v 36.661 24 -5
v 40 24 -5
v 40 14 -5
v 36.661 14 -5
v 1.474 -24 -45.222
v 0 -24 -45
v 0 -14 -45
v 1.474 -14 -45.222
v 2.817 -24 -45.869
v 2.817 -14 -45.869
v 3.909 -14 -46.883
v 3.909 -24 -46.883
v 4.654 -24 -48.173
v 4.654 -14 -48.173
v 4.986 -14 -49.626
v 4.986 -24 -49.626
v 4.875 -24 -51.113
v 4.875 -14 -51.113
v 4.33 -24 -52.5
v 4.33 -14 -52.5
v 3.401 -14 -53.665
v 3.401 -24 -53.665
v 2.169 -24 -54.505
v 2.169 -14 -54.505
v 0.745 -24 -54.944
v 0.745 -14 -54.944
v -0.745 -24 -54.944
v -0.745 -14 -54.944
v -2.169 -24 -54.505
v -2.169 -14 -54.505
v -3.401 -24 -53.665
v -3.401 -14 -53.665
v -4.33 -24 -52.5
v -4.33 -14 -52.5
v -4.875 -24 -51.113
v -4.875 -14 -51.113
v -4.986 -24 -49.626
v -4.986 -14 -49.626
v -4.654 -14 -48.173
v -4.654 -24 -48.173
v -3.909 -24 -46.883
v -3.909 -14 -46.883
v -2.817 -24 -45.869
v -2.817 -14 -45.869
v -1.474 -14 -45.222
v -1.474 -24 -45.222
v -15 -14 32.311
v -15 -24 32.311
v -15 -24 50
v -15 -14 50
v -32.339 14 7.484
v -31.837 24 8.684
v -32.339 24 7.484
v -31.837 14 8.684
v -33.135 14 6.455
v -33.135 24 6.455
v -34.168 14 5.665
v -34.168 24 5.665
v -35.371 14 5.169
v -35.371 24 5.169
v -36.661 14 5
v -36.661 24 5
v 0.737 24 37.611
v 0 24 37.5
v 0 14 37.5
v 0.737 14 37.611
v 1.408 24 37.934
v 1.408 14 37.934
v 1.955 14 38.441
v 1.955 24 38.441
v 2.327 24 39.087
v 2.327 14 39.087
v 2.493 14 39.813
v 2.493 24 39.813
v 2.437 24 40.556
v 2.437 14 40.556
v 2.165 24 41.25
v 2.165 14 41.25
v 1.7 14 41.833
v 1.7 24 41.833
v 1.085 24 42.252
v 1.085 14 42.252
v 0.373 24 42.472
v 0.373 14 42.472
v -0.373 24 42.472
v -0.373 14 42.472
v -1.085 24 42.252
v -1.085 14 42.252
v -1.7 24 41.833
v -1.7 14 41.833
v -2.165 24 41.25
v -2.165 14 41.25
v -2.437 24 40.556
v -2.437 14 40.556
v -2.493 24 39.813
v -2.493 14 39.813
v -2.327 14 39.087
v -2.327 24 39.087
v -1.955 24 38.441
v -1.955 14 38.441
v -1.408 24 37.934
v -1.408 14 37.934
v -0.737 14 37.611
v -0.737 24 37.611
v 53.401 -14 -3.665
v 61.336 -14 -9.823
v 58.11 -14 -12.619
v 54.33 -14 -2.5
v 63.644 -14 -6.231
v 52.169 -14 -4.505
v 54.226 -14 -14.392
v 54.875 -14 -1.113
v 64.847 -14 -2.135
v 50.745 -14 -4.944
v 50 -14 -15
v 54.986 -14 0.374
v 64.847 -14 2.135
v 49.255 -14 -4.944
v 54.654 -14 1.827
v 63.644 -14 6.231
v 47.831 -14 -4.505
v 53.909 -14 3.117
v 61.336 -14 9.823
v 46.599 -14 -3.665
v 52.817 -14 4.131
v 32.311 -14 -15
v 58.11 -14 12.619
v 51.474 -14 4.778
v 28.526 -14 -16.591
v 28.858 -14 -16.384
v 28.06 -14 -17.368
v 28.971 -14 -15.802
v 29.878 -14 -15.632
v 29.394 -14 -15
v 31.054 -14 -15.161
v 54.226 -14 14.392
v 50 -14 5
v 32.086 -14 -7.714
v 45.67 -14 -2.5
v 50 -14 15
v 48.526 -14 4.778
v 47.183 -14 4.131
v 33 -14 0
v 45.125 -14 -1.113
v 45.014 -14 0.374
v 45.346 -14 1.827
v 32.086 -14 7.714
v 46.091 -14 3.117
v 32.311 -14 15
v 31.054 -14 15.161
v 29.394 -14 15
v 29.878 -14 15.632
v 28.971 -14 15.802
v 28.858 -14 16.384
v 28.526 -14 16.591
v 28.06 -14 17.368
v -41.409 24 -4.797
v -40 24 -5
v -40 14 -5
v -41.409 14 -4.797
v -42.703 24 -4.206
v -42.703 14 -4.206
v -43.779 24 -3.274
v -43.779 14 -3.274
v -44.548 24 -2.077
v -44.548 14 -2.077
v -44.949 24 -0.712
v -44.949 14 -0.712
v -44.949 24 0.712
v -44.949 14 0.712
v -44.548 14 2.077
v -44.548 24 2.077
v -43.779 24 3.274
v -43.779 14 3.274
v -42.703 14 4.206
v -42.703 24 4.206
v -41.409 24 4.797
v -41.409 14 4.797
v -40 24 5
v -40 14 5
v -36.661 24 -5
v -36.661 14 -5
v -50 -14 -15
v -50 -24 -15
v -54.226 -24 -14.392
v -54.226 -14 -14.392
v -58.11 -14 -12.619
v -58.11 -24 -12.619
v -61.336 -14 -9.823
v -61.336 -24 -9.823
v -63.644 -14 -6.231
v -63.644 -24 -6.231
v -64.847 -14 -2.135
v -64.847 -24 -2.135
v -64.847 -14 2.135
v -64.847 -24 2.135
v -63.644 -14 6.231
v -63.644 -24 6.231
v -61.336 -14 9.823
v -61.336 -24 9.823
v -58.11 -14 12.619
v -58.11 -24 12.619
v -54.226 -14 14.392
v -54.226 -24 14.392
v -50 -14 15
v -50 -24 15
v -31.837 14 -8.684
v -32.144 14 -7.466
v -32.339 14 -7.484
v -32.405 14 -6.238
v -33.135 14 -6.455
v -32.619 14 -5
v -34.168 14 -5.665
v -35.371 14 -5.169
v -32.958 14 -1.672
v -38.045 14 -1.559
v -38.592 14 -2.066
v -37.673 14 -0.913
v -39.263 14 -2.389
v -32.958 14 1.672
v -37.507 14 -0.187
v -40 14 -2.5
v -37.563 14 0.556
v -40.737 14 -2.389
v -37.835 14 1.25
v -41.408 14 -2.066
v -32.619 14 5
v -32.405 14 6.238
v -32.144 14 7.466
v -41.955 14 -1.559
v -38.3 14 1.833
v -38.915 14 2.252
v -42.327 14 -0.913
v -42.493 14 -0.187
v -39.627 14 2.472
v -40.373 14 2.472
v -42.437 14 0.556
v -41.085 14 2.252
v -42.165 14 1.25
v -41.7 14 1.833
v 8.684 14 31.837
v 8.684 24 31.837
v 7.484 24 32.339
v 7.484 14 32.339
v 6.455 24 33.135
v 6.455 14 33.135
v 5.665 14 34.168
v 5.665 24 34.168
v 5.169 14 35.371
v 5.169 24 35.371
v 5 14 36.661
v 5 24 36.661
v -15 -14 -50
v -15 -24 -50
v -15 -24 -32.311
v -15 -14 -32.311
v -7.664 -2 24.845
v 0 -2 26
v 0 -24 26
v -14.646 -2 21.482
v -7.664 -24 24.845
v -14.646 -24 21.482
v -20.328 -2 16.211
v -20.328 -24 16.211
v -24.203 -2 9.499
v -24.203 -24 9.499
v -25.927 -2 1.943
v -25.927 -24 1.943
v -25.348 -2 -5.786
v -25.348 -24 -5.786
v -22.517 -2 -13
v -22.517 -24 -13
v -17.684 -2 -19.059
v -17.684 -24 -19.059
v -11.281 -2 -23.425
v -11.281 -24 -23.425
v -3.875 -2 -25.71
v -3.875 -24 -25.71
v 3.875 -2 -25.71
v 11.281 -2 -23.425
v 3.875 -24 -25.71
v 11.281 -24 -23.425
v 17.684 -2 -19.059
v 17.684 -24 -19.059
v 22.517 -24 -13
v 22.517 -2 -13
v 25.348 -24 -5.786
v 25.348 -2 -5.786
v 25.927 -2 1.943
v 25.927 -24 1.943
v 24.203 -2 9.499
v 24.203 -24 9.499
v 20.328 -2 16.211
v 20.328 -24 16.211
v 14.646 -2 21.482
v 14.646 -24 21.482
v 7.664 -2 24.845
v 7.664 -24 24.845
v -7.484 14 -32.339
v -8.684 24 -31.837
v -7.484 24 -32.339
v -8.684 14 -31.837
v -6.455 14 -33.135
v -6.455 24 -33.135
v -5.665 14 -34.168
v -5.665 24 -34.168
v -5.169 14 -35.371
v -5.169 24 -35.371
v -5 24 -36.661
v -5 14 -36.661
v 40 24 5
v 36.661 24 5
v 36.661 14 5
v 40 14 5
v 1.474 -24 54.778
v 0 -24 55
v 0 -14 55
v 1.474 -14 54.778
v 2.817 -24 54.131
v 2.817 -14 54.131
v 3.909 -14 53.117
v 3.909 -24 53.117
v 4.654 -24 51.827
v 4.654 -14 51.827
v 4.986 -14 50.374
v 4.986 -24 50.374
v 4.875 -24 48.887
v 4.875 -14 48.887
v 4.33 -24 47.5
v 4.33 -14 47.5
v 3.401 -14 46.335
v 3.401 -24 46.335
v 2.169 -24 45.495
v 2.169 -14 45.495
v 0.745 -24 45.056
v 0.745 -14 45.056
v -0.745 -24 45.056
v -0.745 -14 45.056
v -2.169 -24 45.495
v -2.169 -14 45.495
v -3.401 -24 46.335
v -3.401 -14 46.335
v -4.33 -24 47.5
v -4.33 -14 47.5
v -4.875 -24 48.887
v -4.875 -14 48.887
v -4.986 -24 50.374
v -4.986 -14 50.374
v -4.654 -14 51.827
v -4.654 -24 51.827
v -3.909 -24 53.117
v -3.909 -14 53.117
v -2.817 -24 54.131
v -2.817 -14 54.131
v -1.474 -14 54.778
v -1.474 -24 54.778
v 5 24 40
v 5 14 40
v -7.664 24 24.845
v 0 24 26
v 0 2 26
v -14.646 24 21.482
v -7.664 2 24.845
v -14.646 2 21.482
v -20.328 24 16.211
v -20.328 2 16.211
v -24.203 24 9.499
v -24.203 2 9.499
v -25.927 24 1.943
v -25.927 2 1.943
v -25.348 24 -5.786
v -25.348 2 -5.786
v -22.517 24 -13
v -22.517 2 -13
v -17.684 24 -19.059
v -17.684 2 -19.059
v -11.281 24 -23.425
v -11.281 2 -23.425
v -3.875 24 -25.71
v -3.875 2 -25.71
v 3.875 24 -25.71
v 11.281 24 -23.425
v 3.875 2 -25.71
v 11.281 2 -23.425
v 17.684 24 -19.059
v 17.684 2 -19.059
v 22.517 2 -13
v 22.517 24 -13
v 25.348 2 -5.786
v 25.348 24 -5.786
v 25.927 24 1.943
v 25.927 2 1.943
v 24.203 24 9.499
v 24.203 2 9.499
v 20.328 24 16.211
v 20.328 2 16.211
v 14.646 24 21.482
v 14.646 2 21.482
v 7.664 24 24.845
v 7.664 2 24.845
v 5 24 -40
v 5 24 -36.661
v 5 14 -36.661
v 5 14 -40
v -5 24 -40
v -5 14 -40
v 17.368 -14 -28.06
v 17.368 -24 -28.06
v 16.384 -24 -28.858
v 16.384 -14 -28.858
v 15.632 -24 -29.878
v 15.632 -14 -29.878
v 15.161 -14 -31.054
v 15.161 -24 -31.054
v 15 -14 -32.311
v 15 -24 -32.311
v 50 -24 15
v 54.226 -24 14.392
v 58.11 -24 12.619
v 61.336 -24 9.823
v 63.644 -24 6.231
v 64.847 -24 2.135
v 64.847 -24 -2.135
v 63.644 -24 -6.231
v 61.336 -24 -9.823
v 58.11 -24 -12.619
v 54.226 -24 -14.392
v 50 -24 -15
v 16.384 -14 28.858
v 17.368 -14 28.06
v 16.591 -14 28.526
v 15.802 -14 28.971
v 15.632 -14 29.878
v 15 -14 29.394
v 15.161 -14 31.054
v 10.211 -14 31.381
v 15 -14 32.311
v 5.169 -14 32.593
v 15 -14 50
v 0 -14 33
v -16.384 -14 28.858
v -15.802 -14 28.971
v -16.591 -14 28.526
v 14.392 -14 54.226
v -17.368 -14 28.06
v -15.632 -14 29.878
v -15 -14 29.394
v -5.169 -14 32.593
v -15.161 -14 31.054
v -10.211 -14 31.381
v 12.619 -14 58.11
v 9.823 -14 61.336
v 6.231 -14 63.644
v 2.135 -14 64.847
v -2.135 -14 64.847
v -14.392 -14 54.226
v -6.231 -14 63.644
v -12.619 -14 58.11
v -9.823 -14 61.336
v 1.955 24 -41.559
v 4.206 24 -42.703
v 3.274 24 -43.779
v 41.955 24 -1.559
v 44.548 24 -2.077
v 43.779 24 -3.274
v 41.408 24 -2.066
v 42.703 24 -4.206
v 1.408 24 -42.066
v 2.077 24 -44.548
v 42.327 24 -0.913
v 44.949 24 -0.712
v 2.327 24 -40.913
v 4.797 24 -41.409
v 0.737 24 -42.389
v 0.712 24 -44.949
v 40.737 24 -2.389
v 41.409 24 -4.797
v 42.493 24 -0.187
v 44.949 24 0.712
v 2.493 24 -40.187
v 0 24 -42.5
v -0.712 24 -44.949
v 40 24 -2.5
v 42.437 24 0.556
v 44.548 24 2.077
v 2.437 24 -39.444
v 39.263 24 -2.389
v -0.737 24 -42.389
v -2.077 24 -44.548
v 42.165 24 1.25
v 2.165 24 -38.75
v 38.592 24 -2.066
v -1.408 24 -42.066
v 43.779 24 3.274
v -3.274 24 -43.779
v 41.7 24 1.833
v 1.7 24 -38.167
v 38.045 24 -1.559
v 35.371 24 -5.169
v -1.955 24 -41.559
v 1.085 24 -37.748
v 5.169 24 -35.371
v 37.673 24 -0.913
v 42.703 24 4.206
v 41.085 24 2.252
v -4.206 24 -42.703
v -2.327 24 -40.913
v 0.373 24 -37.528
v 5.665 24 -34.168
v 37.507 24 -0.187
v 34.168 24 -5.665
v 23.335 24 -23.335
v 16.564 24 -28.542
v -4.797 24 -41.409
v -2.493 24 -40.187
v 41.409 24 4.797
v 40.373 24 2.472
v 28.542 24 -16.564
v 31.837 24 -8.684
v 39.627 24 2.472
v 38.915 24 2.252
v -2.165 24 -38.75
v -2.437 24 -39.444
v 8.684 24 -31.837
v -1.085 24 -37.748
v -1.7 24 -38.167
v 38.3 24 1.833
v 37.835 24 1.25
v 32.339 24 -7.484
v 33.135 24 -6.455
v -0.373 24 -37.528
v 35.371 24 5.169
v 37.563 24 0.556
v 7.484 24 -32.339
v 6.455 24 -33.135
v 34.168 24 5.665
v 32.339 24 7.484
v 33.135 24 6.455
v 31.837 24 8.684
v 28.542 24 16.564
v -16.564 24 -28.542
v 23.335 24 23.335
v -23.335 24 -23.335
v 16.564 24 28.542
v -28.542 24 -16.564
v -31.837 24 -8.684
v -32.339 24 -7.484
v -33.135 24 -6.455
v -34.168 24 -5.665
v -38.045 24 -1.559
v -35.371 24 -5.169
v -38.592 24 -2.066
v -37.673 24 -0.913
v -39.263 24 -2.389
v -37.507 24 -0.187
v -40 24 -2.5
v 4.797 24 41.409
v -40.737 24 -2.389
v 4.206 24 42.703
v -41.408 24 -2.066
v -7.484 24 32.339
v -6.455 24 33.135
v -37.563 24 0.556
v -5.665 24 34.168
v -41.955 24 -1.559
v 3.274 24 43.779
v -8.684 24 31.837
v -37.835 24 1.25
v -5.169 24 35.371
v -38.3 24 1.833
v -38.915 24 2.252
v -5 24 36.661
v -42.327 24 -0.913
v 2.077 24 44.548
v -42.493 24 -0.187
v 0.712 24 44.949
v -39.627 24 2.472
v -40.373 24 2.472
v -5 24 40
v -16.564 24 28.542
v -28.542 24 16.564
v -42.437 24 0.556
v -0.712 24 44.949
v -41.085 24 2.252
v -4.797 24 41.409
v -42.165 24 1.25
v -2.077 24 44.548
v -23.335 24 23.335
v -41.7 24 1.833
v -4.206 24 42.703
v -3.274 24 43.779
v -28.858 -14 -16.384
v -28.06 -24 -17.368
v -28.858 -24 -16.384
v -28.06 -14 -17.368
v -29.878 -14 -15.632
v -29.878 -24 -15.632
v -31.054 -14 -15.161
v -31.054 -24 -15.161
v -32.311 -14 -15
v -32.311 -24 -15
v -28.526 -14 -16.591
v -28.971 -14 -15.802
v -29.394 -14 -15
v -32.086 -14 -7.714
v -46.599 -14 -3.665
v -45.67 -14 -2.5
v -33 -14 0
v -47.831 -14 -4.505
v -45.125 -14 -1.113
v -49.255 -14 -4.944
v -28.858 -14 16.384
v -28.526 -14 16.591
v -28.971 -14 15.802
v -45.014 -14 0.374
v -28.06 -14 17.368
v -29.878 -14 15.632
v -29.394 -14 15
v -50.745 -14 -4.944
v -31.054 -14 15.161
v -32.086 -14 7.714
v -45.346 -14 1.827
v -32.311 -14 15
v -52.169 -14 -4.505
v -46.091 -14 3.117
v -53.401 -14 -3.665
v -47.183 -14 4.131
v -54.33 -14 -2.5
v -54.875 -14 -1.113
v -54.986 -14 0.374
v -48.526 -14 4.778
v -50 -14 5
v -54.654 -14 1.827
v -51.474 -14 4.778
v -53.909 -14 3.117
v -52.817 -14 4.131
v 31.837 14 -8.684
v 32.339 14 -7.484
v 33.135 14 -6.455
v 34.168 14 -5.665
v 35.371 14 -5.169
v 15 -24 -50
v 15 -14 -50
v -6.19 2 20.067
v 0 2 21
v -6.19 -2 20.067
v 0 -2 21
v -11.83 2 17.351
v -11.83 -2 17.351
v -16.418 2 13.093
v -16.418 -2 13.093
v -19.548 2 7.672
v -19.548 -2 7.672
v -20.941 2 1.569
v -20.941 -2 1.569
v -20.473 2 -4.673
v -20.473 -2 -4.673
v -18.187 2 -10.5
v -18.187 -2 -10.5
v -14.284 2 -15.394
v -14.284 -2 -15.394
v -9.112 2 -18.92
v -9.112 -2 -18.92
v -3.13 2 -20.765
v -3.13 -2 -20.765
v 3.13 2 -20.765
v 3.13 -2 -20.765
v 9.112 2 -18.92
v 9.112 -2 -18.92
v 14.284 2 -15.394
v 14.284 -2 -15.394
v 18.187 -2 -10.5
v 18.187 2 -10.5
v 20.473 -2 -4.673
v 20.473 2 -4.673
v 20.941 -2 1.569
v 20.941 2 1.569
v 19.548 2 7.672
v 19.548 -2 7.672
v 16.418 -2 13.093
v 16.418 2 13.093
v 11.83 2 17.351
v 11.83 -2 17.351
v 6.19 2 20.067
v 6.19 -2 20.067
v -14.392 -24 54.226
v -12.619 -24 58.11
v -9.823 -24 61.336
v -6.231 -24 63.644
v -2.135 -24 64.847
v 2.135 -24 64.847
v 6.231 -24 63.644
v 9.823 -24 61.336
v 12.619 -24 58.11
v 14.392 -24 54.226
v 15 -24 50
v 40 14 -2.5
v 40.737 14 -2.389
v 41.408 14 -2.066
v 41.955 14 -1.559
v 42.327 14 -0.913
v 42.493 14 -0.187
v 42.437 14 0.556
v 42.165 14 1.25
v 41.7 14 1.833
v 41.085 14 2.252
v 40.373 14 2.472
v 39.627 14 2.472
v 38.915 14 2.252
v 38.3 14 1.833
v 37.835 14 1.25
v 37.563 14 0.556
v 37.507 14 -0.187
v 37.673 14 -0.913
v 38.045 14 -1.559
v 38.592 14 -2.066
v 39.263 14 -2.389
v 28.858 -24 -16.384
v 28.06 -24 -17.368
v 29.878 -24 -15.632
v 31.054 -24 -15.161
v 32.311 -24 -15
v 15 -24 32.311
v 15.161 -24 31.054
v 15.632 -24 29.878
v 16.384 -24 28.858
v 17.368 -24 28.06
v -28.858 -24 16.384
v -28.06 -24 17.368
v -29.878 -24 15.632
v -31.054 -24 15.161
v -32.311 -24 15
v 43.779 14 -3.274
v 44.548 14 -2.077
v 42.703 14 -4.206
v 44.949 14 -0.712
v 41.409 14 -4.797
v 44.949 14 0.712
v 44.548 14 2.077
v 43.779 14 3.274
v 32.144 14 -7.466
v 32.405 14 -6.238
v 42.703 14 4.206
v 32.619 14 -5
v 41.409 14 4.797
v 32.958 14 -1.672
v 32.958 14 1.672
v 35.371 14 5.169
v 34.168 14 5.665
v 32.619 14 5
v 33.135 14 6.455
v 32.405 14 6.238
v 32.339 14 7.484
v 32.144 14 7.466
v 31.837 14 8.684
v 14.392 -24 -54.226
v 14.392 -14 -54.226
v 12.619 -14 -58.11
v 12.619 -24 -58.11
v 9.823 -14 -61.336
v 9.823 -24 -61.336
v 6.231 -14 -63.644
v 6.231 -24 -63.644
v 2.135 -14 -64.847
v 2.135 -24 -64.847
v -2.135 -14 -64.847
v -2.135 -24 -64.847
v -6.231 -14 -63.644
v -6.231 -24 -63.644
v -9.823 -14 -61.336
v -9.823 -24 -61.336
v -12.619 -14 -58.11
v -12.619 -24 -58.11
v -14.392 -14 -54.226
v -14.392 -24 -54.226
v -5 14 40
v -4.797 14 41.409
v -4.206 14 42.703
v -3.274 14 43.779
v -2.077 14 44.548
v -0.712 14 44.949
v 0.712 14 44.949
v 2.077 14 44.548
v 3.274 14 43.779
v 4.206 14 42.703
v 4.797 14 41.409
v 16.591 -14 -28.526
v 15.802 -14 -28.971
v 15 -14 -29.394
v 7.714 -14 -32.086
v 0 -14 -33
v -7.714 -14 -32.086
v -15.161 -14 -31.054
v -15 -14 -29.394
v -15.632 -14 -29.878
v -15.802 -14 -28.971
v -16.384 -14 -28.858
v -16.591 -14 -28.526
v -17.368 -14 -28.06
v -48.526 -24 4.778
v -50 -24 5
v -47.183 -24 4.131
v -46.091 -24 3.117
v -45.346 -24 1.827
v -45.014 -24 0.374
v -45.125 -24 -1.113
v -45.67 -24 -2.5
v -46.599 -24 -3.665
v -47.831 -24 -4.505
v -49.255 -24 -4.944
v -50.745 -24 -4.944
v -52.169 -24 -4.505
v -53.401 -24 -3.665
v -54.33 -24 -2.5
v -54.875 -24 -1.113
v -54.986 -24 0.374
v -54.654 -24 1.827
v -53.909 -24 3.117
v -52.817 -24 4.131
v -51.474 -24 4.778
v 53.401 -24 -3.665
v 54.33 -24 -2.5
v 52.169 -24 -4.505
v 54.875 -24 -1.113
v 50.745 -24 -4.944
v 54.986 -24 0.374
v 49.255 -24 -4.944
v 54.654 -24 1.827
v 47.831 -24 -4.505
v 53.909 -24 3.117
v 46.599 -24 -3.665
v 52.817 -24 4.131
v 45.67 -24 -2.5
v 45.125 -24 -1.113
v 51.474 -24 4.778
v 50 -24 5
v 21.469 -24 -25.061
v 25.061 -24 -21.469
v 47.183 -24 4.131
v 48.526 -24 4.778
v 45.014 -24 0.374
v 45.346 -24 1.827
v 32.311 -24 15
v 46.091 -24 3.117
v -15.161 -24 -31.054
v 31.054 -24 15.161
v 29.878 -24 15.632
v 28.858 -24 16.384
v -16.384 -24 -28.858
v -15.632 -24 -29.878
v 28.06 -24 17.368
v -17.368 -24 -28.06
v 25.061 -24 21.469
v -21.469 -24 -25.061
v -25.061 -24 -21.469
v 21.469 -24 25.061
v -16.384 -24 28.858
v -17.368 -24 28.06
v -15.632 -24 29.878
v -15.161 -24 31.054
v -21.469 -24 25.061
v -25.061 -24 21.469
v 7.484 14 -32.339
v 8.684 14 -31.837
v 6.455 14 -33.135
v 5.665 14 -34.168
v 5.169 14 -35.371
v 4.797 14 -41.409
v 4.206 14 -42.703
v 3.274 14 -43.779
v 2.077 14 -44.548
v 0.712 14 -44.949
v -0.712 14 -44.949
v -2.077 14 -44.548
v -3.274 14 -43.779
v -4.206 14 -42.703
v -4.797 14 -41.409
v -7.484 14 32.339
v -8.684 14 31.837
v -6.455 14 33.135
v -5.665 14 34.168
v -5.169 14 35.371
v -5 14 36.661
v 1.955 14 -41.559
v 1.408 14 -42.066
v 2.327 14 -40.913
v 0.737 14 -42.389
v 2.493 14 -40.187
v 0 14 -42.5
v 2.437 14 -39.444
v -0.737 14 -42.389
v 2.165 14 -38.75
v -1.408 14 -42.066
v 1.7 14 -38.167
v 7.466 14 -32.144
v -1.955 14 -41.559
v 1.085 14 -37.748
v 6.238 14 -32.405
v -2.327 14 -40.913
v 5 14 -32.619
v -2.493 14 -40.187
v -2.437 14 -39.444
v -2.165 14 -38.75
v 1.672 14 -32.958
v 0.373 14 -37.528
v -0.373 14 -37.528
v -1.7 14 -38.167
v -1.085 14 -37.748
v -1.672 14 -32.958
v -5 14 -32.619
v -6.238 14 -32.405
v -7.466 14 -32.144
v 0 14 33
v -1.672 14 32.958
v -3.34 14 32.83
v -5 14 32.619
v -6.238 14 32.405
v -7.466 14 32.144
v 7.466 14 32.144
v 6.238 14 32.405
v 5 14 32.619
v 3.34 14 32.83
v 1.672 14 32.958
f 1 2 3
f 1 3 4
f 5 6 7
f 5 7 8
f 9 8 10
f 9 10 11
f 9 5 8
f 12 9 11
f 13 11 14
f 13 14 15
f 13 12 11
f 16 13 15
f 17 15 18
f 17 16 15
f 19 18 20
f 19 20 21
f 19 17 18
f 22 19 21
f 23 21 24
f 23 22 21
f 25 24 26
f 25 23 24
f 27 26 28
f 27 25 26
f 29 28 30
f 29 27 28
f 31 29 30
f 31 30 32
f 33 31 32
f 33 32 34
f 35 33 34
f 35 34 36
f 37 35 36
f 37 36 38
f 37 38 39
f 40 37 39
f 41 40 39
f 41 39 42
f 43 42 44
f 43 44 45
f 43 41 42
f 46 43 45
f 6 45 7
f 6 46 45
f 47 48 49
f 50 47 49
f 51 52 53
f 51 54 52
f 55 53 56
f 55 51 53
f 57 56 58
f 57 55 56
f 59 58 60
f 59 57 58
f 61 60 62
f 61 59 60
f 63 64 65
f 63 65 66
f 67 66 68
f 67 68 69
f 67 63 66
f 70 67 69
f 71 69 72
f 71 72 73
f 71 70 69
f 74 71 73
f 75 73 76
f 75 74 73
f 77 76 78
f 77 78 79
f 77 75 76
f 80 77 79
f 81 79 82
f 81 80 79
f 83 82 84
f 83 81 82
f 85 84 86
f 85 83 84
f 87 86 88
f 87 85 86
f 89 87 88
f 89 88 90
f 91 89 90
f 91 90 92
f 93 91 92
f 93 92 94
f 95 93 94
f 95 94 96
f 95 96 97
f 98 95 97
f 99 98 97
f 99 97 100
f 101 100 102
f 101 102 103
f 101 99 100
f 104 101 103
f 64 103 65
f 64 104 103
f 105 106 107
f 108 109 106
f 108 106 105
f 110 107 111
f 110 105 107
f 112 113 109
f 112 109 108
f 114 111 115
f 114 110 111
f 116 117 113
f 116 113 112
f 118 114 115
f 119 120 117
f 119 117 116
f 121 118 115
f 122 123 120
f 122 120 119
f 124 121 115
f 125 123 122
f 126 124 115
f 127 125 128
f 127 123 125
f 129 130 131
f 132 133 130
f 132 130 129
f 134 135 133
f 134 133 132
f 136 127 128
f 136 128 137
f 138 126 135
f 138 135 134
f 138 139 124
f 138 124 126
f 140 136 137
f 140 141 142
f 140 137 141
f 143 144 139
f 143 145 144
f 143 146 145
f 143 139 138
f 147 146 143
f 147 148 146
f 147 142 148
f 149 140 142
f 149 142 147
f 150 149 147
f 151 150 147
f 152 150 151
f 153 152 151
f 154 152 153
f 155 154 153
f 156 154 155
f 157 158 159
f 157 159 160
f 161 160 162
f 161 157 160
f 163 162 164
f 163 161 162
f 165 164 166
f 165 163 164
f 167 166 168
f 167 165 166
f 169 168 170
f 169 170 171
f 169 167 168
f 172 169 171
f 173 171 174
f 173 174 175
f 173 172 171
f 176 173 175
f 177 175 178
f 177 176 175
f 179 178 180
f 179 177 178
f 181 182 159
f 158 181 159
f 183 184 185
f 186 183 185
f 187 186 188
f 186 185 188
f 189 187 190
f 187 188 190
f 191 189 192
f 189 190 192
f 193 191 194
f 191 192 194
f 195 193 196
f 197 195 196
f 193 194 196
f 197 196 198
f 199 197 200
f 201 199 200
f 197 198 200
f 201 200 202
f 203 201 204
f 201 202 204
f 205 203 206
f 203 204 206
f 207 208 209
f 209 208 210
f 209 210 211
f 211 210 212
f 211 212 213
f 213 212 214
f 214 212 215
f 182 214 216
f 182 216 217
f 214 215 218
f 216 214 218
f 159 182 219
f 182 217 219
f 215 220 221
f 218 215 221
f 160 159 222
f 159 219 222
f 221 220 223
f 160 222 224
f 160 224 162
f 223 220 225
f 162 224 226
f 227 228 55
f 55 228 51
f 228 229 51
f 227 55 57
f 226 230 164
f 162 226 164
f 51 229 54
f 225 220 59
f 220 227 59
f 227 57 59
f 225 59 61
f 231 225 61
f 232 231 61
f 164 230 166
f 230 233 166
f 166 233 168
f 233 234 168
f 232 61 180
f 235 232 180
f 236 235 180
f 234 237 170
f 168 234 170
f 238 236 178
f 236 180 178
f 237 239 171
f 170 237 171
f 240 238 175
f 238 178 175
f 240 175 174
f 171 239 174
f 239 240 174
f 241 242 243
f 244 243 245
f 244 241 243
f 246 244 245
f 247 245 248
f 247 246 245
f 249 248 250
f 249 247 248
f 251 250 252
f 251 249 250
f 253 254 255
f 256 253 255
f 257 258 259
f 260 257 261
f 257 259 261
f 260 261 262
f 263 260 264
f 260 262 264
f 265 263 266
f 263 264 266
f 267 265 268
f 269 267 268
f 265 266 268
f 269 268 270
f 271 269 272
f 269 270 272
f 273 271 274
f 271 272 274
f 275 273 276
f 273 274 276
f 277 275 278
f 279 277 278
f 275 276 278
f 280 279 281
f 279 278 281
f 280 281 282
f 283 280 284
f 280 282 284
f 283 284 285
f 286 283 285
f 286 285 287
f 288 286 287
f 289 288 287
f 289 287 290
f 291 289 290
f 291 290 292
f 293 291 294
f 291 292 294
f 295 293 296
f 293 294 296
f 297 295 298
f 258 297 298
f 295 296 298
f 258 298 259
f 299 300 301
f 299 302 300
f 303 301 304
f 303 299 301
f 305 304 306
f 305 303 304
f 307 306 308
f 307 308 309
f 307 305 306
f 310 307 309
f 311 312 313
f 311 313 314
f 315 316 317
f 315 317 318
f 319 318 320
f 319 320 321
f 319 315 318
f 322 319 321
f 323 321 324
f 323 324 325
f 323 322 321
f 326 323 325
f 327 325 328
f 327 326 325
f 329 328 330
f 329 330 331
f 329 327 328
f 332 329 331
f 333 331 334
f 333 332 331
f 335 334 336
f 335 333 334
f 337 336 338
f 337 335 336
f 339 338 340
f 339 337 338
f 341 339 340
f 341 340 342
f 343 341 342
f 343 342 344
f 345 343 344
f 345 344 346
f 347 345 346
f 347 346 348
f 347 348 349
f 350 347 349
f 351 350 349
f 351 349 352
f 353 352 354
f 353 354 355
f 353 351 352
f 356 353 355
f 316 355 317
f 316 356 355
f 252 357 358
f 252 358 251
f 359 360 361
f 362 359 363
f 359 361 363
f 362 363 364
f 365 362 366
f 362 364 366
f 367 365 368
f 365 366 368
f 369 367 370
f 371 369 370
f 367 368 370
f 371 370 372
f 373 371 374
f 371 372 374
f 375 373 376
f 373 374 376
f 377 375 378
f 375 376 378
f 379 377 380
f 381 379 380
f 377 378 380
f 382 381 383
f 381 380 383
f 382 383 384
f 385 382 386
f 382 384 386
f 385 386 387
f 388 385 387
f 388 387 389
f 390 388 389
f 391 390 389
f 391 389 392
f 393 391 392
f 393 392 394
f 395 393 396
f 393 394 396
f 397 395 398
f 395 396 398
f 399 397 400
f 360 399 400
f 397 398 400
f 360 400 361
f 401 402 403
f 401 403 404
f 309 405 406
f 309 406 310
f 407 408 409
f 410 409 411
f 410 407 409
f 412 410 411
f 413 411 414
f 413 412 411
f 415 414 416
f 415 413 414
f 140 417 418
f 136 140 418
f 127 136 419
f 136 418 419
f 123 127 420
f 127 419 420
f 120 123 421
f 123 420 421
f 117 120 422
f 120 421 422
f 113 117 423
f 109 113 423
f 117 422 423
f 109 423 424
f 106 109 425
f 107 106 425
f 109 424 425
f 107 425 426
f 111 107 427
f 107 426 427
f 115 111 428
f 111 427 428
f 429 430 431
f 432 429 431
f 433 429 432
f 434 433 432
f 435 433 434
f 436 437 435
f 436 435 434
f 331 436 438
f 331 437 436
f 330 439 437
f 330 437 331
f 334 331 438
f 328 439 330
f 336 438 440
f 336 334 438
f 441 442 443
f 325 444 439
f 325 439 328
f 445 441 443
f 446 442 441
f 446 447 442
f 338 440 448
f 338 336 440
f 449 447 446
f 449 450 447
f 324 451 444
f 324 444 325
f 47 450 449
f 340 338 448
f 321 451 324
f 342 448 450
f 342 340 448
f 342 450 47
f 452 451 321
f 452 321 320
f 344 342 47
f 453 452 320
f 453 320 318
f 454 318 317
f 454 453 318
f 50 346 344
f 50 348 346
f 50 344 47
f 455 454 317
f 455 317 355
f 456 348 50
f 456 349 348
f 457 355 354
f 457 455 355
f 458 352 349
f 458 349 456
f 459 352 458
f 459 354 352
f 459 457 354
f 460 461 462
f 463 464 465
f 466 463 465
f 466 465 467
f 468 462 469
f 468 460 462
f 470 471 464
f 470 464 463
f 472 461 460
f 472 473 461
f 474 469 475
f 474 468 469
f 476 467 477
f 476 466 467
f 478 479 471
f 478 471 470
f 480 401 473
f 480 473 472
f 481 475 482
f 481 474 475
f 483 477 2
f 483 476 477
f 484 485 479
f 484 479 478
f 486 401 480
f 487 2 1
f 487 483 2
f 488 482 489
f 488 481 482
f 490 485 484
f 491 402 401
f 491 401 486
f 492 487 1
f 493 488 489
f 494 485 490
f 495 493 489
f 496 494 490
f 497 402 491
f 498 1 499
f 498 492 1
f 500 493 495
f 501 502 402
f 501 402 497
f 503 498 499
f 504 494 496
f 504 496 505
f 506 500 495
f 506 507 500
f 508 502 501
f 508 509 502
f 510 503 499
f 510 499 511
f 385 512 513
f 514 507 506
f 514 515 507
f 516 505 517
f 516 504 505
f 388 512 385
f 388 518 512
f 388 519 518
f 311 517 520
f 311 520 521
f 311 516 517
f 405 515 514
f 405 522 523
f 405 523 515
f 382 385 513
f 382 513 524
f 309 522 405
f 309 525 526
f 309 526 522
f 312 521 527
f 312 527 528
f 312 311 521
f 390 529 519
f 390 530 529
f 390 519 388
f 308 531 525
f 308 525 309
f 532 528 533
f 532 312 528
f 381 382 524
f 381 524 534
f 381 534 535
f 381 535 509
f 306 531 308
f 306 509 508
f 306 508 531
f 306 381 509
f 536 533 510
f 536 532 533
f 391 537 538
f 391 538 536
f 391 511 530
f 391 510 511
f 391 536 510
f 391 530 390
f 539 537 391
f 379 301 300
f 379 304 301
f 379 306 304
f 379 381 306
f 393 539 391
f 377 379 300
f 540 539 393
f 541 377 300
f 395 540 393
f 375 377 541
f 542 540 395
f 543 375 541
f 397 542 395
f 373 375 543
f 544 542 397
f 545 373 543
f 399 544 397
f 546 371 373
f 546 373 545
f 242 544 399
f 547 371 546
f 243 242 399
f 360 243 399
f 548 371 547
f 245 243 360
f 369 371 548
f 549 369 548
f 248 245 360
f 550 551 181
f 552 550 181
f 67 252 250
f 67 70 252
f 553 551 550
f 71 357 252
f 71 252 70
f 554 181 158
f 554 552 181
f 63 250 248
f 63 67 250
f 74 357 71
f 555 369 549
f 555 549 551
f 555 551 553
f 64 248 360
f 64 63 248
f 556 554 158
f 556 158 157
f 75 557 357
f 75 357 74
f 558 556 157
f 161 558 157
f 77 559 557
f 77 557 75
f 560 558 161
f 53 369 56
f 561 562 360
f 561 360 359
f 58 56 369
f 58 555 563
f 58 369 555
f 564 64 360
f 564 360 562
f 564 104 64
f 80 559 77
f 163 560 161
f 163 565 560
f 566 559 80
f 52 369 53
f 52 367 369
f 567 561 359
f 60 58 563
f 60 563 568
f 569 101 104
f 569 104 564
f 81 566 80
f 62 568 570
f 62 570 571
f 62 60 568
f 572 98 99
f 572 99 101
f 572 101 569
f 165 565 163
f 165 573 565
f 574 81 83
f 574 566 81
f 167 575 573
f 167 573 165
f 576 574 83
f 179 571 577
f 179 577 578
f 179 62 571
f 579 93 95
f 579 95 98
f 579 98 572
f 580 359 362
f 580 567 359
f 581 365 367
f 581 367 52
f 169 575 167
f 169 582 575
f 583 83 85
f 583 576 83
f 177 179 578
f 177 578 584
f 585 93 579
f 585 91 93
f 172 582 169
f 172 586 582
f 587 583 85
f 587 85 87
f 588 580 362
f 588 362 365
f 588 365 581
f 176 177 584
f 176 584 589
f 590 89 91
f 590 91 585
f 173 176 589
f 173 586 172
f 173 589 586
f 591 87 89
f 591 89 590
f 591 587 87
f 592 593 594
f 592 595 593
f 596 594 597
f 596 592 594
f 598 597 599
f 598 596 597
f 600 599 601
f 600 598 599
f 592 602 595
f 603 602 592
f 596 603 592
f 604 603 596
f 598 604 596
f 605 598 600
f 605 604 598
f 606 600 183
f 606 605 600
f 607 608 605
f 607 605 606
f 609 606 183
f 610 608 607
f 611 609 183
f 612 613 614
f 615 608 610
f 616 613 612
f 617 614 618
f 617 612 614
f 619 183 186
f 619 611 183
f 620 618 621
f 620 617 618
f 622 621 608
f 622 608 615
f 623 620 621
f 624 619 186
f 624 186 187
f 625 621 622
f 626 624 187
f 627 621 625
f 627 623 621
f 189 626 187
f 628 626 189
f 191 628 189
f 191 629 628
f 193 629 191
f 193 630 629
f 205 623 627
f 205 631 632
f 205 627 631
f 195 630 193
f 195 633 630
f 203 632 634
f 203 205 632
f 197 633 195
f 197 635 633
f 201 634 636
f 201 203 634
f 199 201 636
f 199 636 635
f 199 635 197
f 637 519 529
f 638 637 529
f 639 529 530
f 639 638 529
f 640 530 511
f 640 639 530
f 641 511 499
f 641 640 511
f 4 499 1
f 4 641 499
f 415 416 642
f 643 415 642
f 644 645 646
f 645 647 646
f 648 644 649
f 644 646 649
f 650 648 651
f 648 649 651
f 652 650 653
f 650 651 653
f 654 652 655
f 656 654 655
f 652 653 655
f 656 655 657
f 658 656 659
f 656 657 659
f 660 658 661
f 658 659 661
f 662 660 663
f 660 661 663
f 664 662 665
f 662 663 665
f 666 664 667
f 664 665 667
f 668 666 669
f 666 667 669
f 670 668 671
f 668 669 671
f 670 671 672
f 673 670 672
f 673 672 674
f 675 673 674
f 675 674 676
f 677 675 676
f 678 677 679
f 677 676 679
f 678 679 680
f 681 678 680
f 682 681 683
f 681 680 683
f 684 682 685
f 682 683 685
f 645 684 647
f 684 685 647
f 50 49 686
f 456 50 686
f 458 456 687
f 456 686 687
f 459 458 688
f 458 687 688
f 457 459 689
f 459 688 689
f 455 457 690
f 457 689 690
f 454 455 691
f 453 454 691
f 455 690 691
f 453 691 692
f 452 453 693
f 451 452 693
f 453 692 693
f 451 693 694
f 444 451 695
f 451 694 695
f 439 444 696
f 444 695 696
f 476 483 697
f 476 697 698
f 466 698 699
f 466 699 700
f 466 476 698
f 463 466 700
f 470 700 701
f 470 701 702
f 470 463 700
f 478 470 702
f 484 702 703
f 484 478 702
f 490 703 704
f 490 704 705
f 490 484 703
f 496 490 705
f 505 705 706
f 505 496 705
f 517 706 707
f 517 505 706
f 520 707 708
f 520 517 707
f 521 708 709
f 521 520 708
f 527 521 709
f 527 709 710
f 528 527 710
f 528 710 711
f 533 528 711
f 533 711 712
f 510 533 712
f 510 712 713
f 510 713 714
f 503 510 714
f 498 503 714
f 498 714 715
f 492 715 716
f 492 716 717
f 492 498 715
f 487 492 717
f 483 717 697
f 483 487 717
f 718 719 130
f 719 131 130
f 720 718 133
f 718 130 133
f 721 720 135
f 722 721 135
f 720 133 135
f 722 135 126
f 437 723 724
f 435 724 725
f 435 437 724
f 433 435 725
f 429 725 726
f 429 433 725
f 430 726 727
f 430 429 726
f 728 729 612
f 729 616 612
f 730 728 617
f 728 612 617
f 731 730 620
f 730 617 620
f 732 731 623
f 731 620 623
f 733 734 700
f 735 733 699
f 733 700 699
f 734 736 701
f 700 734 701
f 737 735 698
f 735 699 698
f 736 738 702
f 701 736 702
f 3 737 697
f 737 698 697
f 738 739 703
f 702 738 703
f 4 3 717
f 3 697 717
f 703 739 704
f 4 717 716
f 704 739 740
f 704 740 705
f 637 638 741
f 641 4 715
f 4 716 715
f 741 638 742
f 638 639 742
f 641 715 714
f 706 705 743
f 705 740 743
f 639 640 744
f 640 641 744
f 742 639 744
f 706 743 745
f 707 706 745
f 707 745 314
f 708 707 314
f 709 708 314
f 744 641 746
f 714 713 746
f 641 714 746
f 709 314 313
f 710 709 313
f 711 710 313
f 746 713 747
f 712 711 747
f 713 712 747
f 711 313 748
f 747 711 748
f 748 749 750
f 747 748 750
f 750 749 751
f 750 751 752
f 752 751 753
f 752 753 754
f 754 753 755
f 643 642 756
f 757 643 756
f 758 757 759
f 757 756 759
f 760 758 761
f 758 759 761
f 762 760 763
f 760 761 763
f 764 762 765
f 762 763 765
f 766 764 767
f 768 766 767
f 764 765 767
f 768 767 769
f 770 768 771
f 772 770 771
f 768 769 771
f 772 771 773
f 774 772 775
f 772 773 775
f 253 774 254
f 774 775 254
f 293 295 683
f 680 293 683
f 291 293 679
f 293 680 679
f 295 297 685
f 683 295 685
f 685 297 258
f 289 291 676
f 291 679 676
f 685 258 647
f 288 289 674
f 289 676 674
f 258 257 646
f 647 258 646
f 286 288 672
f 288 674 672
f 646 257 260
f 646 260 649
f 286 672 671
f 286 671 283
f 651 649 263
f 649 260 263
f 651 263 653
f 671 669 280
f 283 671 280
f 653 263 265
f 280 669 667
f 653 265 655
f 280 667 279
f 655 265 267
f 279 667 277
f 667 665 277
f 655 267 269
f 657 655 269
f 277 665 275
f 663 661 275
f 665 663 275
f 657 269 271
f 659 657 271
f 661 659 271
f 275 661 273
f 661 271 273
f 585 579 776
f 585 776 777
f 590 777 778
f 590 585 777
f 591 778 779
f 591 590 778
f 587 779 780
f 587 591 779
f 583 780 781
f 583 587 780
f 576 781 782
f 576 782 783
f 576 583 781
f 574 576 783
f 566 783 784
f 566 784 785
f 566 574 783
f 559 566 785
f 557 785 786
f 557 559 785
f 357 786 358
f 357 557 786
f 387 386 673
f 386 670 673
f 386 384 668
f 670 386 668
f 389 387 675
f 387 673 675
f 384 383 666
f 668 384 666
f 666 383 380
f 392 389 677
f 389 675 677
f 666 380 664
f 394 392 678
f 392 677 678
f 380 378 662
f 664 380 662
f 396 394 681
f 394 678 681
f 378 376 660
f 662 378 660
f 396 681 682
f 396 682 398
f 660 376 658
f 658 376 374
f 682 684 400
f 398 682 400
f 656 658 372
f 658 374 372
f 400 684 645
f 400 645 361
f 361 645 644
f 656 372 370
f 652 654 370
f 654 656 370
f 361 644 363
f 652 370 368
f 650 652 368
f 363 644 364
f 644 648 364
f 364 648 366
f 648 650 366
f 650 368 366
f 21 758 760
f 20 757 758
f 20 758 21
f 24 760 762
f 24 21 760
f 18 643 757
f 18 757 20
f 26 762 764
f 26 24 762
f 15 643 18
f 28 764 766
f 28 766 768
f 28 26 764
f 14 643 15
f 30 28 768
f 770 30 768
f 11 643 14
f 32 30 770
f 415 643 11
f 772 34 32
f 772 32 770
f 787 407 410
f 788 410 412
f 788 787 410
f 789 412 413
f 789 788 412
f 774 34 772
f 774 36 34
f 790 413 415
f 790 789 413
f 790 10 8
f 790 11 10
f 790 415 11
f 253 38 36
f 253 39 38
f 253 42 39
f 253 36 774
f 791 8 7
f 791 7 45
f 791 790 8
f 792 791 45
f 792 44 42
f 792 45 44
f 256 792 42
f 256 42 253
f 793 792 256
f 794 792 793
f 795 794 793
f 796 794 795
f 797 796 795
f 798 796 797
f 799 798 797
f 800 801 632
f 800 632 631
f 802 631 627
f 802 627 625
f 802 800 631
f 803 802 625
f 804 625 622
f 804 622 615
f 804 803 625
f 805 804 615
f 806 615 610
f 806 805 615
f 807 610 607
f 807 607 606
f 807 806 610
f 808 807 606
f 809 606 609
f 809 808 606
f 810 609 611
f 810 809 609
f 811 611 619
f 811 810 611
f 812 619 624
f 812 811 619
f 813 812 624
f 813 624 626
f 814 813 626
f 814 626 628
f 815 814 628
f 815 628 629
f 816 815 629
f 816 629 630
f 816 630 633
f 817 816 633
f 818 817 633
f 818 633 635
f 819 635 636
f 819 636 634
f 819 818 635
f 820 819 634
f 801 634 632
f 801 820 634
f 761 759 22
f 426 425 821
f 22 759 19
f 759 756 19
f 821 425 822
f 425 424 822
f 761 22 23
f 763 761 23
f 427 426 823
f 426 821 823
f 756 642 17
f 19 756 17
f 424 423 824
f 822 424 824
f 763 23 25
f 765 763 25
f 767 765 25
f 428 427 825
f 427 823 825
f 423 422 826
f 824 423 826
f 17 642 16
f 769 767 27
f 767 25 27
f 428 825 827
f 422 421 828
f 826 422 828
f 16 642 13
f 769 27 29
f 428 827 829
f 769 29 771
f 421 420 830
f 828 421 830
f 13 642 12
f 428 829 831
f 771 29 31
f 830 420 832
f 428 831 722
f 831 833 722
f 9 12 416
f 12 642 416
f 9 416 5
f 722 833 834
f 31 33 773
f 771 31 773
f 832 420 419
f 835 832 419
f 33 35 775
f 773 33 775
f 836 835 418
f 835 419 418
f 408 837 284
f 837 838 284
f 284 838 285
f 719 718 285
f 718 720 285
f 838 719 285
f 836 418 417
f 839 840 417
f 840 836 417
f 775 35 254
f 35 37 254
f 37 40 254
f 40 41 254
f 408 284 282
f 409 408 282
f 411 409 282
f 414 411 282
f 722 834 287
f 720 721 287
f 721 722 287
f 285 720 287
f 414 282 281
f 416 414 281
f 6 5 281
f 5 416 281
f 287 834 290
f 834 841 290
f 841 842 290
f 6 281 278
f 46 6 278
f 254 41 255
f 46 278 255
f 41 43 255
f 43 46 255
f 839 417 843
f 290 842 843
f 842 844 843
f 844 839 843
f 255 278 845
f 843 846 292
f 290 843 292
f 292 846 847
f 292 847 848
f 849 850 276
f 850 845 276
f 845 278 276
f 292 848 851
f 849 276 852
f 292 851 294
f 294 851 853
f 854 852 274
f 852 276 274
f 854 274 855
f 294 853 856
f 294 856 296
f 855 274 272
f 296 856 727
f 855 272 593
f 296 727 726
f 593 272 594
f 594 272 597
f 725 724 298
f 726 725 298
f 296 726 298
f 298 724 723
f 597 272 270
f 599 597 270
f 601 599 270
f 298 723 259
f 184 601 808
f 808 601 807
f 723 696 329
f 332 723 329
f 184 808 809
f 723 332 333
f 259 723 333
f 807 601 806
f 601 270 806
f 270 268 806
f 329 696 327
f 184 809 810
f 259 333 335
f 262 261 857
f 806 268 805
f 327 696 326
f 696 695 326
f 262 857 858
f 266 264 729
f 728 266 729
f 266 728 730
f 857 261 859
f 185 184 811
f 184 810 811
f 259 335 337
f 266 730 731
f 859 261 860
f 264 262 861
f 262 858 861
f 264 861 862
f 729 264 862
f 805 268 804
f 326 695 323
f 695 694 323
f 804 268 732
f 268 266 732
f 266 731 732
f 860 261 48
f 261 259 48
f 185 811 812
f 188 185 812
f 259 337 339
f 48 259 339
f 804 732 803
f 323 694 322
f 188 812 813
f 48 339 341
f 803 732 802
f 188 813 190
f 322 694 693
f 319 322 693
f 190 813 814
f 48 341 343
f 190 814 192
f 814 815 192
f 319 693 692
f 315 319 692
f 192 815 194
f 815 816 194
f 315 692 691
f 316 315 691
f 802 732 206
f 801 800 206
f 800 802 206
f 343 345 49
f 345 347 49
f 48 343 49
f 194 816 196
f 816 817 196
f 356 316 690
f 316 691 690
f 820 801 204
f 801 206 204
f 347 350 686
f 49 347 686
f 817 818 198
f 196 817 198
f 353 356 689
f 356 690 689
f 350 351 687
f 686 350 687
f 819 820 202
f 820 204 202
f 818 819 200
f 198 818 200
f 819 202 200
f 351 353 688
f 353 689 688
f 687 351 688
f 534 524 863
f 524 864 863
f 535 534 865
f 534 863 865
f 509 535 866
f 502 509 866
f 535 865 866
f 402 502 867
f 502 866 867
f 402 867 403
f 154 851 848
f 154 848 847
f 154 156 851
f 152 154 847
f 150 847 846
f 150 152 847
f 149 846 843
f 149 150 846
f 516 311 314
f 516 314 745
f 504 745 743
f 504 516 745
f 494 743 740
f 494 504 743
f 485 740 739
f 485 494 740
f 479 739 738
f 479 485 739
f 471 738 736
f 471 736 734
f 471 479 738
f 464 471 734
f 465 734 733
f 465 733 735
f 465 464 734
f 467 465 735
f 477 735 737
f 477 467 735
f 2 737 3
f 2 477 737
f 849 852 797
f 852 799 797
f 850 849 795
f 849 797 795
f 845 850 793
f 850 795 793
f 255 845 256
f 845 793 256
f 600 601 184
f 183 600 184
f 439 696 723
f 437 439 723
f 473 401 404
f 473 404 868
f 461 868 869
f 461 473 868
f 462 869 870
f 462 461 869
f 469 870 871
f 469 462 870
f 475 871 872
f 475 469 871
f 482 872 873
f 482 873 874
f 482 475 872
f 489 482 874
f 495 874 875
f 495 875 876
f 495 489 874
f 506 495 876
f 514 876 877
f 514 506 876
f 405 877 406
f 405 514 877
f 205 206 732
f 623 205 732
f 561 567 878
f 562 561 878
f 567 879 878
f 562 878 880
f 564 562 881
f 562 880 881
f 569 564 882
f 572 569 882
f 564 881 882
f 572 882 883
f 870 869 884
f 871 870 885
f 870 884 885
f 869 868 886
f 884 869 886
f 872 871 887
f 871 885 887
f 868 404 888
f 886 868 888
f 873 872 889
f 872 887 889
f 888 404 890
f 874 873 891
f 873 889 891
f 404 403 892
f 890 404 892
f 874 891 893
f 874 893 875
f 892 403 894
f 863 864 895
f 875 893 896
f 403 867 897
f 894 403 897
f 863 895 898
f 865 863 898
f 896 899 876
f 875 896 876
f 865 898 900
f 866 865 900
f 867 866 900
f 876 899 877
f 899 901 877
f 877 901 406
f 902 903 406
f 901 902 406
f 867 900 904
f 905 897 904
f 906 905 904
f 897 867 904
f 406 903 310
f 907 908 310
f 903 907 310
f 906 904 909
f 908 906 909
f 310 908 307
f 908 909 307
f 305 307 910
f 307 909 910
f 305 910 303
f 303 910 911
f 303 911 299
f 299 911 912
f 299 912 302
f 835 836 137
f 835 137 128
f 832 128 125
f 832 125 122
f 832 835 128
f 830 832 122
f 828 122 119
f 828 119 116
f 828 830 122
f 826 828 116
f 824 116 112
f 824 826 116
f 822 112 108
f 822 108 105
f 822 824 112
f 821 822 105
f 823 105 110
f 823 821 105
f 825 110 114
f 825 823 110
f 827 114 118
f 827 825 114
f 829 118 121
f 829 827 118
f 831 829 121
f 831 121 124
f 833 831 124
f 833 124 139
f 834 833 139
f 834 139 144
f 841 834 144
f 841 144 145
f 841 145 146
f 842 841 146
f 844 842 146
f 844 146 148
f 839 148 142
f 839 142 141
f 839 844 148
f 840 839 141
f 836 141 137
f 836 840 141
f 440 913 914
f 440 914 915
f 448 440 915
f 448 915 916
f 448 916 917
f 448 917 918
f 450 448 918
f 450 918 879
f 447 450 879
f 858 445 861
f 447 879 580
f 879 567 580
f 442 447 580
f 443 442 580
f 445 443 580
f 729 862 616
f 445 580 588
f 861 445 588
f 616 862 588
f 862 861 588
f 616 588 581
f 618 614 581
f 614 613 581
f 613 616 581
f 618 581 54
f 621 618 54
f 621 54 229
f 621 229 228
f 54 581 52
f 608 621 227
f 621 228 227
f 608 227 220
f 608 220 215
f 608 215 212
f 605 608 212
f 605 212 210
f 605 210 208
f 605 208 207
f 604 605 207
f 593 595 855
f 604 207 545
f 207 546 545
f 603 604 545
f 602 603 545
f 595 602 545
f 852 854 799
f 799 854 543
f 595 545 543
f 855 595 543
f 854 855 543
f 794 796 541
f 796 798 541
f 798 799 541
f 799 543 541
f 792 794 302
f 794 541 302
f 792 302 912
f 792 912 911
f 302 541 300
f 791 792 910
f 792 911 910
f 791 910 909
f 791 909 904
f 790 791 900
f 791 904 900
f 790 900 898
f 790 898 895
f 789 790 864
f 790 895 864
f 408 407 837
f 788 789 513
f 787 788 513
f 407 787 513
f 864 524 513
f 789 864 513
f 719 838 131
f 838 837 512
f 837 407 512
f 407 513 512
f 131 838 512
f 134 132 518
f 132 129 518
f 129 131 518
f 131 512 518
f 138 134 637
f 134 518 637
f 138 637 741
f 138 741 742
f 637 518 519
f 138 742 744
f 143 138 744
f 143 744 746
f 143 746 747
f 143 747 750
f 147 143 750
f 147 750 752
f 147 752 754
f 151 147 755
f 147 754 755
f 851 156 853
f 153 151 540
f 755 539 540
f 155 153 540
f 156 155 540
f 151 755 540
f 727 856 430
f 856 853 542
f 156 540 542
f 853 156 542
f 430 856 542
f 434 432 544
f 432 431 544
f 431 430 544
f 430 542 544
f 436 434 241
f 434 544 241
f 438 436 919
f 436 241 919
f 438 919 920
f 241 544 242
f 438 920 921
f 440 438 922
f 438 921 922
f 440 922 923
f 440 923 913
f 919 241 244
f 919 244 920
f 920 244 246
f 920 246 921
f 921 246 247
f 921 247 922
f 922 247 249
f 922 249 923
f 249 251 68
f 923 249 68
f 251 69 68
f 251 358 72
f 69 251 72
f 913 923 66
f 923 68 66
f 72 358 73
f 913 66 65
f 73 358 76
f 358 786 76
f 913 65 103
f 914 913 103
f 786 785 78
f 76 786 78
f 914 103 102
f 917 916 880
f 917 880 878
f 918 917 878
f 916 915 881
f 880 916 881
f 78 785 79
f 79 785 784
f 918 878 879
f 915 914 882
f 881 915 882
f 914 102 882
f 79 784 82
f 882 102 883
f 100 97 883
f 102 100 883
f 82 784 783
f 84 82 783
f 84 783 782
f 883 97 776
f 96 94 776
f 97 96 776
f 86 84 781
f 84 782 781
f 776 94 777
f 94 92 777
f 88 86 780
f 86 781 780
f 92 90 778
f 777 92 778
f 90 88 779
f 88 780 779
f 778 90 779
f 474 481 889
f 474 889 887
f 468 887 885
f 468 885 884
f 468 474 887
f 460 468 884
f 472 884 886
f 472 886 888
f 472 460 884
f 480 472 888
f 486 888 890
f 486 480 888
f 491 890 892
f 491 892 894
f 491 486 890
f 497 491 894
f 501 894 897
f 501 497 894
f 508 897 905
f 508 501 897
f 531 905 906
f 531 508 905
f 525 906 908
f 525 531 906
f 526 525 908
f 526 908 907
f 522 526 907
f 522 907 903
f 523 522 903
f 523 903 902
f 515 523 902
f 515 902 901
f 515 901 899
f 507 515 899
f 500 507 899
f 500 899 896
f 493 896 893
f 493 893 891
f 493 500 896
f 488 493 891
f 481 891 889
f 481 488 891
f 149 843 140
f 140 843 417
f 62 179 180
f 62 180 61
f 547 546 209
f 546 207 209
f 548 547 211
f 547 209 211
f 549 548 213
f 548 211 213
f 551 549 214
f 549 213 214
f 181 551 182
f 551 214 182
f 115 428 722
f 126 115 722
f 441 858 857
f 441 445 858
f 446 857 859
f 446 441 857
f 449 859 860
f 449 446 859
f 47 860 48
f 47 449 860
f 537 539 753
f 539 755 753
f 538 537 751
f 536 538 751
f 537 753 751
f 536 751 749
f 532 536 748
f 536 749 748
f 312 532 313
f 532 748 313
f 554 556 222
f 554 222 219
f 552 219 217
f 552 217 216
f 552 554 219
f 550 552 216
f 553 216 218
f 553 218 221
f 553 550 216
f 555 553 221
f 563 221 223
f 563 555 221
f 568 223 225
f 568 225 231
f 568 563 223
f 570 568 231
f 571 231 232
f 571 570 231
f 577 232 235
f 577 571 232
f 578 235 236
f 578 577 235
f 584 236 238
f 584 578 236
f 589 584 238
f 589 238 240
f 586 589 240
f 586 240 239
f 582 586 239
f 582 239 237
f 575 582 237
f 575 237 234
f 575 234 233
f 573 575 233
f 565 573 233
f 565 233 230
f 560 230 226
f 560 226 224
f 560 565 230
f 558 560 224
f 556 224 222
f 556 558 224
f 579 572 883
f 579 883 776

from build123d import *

# Parameters (mm, degrees)
SKETCH2_R           = 2.5
BOSS_EXTRUDE1_DEPTH = 10
SKETCH3_R           = 5
BOSS_EXTRUDE2_DEPTH = 10
FILLET1_R           = 5


with BuildPart() as part:
    # Sketch1 → Revolve1 (revolve)
    with BuildSketch(Plane.XY, mode=Mode.PRIVATE) as revolve1_sk:
        Polygon((26, 24), (26, 2), (21, 2), (21, -2), (26, -2), (26, -24), (33, -24), (33, 24), align=None)
    revolve(revolve1_sk.sketch.rotate(Axis((0, 27.182366668, 0), (0, -1, 0)), 90), axis=Axis((0, 27.182366668, 0), (0, -1, 0)))  # turned: the seam where the file's is

    # Sketch2 → Boss-Extrude1 (add)
    with BuildSketch(Plane.XZ.offset(-24)):
        with BuildLine():
            Line((5, 40), (5, 32.619012861))
            ThreePointArc((5, 32.619012861), (0, 33), (-5, 32.619012861))
            Line((-5, 32.619012861), (-5, 40))
            ThreePointArc((-5, 40), (0, 45), (5, 40))
        make_face()
        with Locations(Location((0, 40, 0), (0, 0, 270))):  # turned: the seam where the file's is
            Circle(SKETCH2_R, mode=Mode.SUBTRACT)
        with BuildLine():
            Line((40, -5), (32.619012861, -5))
            ThreePointArc((32.619012861, -5), (33, 0), (32.619012861, 5))
            Line((32.619012861, 5), (40, 5))
            ThreePointArc((40, 5), (45, 0), (40, -5))
        make_face()
        with Locations(Location((40, 0, 0), (0, 0, 270))):  # turned: the seam where the file's is
            Circle(SKETCH2_R, mode=Mode.SUBTRACT)
        with BuildLine():
            Line((-5, -40), (-5, -32.619012861))
            ThreePointArc((-5, -32.619012861), (0, -33), (5, -32.619012861))
            Line((5, -32.619012861), (5, -40))
            ThreePointArc((5, -40), (0, -45), (-5, -40))
        make_face()
        with Locations(Location((0, -40, 0), (0, 0, 270))):  # turned: the seam where the file's is
            Circle(SKETCH2_R, mode=Mode.SUBTRACT)
        with BuildLine():
            Line((-40, 5), (-32.619012861, 5))
            ThreePointArc((-32.619012861, 5), (-33, 0), (-32.619012861, -5))
            Line((-32.619012861, -5), (-40, -5))
            ThreePointArc((-40, -5), (-45, 0), (-40, 5))
        make_face()
        with Locations(Location((-40, 0, 0), (0, 0, 270))):  # turned: the seam where the file's is
            Circle(SKETCH2_R, mode=Mode.SUBTRACT)
    extrude(amount=BOSS_EXTRUDE1_DEPTH)

    # Sketch3 → Boss-Extrude2 (add)
    with BuildSketch(Plane(origin=(0, -24, 0), x_dir=(-1, 0, 0), z_dir=(0, 1, 0))):
        with BuildLine():
            Line((-15, 50), (-15, 29.393876913))
            ThreePointArc((-15, 29.393876913), (0, 33), (15, 29.393876913))
            Line((15, 29.393876913), (15, 50))
            ThreePointArc((15, 50), (0, 65), (-15, 50))
        make_face()
        with Locations(Location((0, 50, 0), (0, 0, 90))):  # turned: the seam where the file's is
            Circle(SKETCH3_R, mode=Mode.SUBTRACT)
        with BuildLine():
            Line((50, 15), (29.393876913, 15))
            ThreePointArc((29.393876913, 15), (33, 0), (29.393876913, -15))
            Line((29.393876913, -15), (50, -15))
            ThreePointArc((50, -15), (65, 0), (50, 15))
        make_face()
        with Locations(Location((50, 0, 0), (0, 0, 90))):  # turned: the seam where the file's is
            Circle(SKETCH3_R, mode=Mode.SUBTRACT)
        with BuildLine():
            Line((15, -50), (15, -29.393876913))
            ThreePointArc((15, -29.393876913), (0, -33), (-15, -29.393876913))
            Line((-15, -29.393876913), (-15, -50))
            ThreePointArc((-15, -50), (0, -65), (15, -50))
        make_face()
        with Locations(Location((0, -50, 0), (0, 0, 90))):  # turned: the seam where the file's is
            Circle(SKETCH3_R, mode=Mode.SUBTRACT)
        with BuildLine():
            Line((-50, -15), (-29.393876913, -15))
            ThreePointArc((-29.393876913, -15), (-33, 0), (-29.393876913, 15))
            Line((-29.393876913, 15), (-50, 15))
            ThreePointArc((-50, 15), (-65, 0), (-50, -15))
        make_face()
        with Locations(Location((-50, 0, 0), (0, 0, 90))):  # turned: the seam where the file's is
            Circle(SKETCH3_R, mode=Mode.SUBTRACT)
    extrude(amount=BOSS_EXTRUDE2_DEPTH)

    # Fillet1
    fillet1_edges = [part.edges().sort_by_distance(p)[0] for p in [
        (-15, -19, -29.393876913),
        (15, -19, -29.393876913),
        (29.393876913, -19, -15),
        (29.393876913, -19, 15),
        (-5, 19, 32.619012861),
        (5, 19, 32.619012861),
        (32.619012861, 19, 5),
        (32.619012861, 19, -5),
        (5, 19, -32.619012861),
        (-5, 19, -32.619012861),
        (-32.619012861, 19, -5),
        (-32.619012861, 19, 5),
        (15, -19, 29.393876913),
        (-15, -19, 29.393876913),
        (-29.393876913, -19, 15),
        (-29.393876913, -19, -15),
    ]]
    fillet(fillet1_edges, radius=FILLET1_R)


solid = part.part
